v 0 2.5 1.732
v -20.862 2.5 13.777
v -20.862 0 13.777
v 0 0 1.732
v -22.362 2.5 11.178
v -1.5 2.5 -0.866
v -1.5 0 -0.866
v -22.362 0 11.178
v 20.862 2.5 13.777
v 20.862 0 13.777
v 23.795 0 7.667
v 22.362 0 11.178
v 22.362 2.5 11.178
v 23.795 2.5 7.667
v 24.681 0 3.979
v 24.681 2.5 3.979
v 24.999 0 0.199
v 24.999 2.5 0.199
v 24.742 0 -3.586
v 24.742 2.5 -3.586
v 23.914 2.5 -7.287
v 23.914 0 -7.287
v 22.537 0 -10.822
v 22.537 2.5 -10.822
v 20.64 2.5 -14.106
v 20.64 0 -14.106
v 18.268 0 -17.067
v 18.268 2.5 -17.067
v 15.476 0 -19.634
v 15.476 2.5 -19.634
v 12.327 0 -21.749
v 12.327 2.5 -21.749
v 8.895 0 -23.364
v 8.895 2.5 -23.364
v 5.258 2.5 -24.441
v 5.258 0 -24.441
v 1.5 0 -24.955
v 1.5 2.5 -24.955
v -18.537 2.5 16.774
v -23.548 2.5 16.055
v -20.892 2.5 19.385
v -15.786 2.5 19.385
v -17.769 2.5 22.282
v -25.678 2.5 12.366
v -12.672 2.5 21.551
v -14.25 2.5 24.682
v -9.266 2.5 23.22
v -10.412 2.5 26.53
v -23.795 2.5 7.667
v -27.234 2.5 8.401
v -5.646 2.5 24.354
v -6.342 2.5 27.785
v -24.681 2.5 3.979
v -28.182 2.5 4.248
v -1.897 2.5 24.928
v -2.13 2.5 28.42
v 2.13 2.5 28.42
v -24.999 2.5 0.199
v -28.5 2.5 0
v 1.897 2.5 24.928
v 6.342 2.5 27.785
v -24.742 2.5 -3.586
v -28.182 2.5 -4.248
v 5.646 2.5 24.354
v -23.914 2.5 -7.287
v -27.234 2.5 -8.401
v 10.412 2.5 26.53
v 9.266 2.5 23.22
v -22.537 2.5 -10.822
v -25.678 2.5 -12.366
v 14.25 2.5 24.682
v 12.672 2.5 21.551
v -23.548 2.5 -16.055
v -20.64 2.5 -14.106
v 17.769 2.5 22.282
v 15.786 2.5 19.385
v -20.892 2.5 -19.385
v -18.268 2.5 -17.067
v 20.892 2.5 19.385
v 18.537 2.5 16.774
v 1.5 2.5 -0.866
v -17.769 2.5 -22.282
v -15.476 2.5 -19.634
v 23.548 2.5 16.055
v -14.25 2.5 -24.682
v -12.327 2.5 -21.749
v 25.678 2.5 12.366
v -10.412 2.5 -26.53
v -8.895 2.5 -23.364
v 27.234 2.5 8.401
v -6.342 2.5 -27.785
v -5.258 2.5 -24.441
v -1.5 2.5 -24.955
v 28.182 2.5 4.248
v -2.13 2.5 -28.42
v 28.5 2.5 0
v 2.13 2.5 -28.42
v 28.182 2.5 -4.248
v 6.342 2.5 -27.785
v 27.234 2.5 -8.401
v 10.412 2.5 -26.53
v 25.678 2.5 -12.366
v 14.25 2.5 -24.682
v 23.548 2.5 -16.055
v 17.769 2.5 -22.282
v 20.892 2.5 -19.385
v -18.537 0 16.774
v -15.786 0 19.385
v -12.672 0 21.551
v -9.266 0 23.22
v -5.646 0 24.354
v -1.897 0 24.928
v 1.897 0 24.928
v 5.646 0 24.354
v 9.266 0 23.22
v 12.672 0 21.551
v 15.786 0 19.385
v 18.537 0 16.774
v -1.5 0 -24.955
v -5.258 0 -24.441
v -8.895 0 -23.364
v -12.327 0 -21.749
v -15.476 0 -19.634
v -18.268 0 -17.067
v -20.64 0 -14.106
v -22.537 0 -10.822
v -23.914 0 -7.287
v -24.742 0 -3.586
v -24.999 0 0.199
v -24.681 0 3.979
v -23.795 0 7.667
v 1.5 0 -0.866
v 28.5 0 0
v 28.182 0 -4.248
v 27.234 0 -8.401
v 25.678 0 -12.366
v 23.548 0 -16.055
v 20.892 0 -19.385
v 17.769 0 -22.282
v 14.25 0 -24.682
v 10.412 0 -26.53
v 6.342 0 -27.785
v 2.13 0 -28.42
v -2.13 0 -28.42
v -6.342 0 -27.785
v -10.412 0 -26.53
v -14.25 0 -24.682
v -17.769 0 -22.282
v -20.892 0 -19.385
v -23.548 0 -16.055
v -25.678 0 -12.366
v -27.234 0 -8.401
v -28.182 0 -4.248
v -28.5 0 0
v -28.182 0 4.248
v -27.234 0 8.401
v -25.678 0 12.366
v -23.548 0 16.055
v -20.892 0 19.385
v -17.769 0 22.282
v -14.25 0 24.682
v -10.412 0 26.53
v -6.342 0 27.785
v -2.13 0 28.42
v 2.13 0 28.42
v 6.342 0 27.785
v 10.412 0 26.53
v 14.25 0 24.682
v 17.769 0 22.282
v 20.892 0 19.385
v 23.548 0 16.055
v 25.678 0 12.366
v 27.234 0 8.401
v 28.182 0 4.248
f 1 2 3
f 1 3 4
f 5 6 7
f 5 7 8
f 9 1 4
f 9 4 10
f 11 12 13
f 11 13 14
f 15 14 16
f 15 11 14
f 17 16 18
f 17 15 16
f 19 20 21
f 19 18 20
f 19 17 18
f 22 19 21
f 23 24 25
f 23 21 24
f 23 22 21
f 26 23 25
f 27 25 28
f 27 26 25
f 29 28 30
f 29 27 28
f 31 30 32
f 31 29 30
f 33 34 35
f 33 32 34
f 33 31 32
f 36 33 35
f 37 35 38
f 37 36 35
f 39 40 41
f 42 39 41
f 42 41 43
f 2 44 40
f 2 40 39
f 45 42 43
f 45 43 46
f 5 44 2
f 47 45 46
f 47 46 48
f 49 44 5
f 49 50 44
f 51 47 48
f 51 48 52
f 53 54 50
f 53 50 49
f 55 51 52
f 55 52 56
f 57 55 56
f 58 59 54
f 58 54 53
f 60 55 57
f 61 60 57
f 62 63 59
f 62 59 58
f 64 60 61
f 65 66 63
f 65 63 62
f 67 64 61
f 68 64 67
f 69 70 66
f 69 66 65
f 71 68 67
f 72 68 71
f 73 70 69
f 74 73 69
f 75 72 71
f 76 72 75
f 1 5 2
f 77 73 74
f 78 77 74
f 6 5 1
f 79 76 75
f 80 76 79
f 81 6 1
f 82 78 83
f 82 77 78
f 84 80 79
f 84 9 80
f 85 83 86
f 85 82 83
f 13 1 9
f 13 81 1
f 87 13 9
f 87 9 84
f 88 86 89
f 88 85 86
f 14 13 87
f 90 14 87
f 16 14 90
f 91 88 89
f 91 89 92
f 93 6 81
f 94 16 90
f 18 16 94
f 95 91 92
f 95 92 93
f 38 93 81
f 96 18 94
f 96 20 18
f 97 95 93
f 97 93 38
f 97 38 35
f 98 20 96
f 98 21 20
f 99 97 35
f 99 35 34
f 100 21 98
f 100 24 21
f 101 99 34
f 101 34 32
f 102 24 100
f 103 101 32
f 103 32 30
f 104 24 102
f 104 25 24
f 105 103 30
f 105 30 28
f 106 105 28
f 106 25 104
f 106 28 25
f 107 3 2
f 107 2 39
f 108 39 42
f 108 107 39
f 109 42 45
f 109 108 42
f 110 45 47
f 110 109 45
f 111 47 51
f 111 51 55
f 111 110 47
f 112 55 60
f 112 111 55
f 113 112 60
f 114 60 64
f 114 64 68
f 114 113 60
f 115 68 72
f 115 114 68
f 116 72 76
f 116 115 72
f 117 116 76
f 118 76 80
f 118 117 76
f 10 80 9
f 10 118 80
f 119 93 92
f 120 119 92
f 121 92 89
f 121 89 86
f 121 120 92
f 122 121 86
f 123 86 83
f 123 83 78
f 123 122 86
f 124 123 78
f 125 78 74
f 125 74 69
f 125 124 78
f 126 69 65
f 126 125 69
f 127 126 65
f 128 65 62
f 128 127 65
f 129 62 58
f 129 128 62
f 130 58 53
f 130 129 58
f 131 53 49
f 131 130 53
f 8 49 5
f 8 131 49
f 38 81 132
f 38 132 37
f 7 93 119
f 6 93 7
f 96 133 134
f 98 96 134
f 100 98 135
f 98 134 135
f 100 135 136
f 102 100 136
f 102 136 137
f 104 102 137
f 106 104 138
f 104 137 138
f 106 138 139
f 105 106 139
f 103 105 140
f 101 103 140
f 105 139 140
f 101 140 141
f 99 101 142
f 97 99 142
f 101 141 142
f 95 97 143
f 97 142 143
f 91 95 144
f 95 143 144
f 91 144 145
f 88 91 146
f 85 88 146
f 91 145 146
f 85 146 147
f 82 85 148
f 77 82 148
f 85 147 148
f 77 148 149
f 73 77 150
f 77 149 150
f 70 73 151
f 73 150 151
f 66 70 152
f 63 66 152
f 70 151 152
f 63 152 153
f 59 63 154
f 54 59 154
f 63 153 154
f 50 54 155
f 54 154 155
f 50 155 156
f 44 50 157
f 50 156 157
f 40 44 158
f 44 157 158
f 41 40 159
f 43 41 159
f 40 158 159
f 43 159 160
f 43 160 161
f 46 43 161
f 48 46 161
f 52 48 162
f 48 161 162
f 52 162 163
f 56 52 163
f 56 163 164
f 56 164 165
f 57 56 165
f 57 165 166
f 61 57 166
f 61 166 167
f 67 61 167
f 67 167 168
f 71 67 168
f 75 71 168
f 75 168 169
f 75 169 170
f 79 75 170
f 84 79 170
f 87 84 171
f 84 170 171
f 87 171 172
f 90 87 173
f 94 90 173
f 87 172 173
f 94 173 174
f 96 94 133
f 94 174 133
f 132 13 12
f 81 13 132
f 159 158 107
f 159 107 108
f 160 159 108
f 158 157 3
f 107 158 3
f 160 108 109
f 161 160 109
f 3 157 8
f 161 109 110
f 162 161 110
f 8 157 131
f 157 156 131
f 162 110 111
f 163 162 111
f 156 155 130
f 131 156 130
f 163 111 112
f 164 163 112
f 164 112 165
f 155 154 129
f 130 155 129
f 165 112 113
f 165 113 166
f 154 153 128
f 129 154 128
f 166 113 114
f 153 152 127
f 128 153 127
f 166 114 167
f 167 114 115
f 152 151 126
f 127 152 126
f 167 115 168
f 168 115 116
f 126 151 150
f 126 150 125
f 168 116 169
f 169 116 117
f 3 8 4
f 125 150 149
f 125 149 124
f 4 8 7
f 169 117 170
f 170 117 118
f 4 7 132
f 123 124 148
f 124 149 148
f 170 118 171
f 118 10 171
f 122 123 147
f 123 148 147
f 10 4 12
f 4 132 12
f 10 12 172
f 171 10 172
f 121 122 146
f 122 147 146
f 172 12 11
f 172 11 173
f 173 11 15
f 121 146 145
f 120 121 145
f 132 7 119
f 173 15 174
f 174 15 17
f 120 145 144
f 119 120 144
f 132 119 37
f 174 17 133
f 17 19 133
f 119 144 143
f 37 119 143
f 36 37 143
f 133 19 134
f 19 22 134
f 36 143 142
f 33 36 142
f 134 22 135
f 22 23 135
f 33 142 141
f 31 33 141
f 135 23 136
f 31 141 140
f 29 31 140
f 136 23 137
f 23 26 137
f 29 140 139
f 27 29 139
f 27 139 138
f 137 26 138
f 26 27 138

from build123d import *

# Parameters (mm, degrees)
SKETCH1_R           = 28.5
SKETCH1_R_2         = 25
BOSS_EXTRUDE1_DEPTH = 2.5
BOSS_EXTRUDE2_DEPTH = 2.5


with BuildPart() as part:
    # Sketch1 → Boss-Extrude1 (new body)
    with BuildSketch(Plane(origin=(0, 0, 0), x_dir=(1, 0, 0), z_dir=(0, 1, 0))):
        Circle(SKETCH1_R)
        Circle(SKETCH1_R_2, mode=Mode.SUBTRACT)
    extrude(amount=BOSS_EXTRUDE1_DEPTH)

    # Sketch2 → Boss-Extrude2 (add)
    with BuildSketch(Plane(origin=(0, 2.5, 0), x_dir=(1, 0, 0), z_dir=(0, 1, 0))):
        Polygon((-1.5, 0.866025404), (-22.400635095, -11.200961894), (-20.900635095, -13.799038106), (0, -1.732050808), (20.900635095, -13.799038106), (22.400635095, -11.200961894), (1.5, 0.866025404), (1.5, 25), (-1.5, 25), align=None)
    extrude(amount=-BOSS_EXTRUDE2_DEPTH)


solid = part.part
